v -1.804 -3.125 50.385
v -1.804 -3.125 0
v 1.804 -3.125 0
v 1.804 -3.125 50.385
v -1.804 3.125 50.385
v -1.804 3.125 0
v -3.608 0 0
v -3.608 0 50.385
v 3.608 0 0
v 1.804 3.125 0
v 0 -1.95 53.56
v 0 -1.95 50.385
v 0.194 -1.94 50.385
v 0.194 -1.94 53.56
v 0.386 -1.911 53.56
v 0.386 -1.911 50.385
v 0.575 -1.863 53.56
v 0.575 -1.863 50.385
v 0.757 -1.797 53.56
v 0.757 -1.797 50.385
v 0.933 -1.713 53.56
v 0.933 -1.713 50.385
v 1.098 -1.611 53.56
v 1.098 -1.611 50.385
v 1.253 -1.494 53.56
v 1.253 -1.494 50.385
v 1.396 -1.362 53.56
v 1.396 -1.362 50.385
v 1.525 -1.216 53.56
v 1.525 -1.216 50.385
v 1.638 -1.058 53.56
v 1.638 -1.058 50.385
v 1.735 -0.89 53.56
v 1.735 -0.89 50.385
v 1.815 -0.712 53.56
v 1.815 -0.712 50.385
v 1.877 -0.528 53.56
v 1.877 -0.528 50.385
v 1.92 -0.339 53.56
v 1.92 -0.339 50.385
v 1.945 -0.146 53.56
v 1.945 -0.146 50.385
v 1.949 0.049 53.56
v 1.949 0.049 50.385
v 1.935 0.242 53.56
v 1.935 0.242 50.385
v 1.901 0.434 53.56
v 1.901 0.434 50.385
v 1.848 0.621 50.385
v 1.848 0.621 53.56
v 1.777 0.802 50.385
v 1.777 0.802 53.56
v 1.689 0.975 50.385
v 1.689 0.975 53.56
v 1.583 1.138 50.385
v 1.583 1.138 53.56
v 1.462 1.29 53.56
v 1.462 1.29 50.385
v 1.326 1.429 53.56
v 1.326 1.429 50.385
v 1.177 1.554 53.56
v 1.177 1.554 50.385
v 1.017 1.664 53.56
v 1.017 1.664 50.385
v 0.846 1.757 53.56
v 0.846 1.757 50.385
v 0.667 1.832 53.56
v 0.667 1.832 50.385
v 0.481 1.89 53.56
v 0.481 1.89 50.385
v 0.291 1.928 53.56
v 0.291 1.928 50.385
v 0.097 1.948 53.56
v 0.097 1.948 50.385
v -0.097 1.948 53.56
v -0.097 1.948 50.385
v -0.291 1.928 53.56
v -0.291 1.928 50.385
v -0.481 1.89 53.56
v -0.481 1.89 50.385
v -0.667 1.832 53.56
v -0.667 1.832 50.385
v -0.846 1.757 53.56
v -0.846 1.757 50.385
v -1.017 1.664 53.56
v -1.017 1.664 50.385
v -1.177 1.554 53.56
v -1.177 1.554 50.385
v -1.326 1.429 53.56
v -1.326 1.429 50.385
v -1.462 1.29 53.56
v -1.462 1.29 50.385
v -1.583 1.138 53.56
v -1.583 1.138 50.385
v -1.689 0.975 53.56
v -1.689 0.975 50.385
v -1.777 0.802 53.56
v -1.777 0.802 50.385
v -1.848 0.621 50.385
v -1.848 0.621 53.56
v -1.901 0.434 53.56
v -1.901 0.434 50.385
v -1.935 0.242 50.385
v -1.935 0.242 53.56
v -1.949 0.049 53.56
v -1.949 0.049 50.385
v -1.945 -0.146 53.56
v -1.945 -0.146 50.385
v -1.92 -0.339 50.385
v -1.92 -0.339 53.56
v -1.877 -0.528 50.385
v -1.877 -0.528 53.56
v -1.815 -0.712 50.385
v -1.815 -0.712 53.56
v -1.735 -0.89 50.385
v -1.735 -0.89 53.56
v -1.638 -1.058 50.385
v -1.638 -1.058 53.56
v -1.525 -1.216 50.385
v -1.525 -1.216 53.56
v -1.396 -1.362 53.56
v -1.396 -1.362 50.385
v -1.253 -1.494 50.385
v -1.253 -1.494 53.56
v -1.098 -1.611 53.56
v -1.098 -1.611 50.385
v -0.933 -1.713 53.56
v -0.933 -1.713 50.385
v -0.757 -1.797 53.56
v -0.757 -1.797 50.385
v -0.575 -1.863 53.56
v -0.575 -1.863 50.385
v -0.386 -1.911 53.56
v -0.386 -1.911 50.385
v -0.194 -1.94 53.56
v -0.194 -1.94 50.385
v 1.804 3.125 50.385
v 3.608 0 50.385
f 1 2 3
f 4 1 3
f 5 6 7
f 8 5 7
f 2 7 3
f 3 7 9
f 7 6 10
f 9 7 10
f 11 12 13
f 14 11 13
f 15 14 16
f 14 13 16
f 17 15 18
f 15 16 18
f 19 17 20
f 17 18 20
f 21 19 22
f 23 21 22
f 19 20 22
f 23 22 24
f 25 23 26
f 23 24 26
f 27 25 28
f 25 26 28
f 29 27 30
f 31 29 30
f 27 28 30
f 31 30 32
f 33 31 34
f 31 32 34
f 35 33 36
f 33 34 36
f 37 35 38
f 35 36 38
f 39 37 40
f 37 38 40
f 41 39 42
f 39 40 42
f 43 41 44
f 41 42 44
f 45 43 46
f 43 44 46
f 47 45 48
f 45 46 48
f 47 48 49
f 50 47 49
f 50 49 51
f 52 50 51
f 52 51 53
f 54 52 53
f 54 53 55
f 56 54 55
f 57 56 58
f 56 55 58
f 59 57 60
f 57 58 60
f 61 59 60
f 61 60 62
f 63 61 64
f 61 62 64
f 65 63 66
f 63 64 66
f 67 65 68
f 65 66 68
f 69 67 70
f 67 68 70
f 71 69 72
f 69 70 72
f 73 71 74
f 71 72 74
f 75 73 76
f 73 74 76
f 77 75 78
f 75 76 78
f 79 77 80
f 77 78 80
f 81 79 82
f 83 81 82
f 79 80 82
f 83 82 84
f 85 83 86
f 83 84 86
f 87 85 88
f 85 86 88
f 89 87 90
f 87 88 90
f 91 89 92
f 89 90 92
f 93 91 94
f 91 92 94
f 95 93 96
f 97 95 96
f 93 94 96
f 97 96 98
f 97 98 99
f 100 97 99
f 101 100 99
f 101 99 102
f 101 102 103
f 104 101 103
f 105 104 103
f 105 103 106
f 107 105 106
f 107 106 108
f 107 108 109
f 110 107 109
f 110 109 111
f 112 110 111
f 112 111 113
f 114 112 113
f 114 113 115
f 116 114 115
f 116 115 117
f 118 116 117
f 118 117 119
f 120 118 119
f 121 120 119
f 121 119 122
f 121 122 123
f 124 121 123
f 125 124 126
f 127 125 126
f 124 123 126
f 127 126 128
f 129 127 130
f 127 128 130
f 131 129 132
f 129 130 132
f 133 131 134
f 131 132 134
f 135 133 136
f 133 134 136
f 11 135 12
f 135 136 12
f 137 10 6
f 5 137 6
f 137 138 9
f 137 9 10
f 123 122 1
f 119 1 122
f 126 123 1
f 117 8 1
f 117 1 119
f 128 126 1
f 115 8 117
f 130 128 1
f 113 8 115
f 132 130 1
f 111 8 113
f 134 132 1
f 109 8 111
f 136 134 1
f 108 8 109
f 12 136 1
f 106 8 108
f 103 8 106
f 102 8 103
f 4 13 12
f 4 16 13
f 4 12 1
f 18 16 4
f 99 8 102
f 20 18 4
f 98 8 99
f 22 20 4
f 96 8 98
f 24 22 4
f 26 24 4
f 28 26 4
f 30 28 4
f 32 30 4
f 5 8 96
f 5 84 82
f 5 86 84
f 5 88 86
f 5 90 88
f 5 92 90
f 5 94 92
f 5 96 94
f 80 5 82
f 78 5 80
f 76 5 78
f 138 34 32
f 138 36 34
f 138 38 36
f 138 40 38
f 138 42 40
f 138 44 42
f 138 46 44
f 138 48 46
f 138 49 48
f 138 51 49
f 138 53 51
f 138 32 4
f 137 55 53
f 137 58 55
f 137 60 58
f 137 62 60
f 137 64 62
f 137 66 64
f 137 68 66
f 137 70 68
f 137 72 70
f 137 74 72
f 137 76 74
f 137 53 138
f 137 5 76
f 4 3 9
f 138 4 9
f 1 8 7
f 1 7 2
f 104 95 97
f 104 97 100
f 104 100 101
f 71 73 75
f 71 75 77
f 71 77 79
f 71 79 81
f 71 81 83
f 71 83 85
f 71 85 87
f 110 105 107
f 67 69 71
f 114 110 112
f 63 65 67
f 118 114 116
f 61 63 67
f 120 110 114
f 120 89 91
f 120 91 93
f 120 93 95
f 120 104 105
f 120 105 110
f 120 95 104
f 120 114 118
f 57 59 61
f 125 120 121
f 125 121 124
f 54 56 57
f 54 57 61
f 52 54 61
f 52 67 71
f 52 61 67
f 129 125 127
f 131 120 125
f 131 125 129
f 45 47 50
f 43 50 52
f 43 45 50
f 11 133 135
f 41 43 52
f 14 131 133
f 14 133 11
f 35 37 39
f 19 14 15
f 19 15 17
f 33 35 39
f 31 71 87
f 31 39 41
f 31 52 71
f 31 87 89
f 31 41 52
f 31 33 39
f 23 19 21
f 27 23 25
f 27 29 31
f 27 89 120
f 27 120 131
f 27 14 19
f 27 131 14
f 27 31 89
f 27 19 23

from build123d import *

# Parameters (mm, degrees)
BOSS_EXTRUDE1_DEPTH = 50.385
SKETCH3_R           = 1.95
BOSS_EXTRUDE2_DEPTH = 3.175


with BuildPart() as part:
    # Sketch1 → Boss-Extrude1 (new body)
    with BuildSketch(Plane.XY):
        Polygon((3.608439182, 0), (1.804219591, 3.125), (-1.804219591, 3.125), (-3.608439182, 0), (-1.804219591, -3.125), (1.804219591, -3.125), align=None)
    extrude(amount=BOSS_EXTRUDE1_DEPTH)

    # Sketch3 → Boss-Extrude2 (add)
    with BuildSketch(Plane.XY.offset(50.385)):
        with Locations(Location((0, 0, 0), (0, 0, 270))):
            Circle(SKETCH3_R)
    extrude(amount=BOSS_EXTRUDE2_DEPTH)


solid = part.part
